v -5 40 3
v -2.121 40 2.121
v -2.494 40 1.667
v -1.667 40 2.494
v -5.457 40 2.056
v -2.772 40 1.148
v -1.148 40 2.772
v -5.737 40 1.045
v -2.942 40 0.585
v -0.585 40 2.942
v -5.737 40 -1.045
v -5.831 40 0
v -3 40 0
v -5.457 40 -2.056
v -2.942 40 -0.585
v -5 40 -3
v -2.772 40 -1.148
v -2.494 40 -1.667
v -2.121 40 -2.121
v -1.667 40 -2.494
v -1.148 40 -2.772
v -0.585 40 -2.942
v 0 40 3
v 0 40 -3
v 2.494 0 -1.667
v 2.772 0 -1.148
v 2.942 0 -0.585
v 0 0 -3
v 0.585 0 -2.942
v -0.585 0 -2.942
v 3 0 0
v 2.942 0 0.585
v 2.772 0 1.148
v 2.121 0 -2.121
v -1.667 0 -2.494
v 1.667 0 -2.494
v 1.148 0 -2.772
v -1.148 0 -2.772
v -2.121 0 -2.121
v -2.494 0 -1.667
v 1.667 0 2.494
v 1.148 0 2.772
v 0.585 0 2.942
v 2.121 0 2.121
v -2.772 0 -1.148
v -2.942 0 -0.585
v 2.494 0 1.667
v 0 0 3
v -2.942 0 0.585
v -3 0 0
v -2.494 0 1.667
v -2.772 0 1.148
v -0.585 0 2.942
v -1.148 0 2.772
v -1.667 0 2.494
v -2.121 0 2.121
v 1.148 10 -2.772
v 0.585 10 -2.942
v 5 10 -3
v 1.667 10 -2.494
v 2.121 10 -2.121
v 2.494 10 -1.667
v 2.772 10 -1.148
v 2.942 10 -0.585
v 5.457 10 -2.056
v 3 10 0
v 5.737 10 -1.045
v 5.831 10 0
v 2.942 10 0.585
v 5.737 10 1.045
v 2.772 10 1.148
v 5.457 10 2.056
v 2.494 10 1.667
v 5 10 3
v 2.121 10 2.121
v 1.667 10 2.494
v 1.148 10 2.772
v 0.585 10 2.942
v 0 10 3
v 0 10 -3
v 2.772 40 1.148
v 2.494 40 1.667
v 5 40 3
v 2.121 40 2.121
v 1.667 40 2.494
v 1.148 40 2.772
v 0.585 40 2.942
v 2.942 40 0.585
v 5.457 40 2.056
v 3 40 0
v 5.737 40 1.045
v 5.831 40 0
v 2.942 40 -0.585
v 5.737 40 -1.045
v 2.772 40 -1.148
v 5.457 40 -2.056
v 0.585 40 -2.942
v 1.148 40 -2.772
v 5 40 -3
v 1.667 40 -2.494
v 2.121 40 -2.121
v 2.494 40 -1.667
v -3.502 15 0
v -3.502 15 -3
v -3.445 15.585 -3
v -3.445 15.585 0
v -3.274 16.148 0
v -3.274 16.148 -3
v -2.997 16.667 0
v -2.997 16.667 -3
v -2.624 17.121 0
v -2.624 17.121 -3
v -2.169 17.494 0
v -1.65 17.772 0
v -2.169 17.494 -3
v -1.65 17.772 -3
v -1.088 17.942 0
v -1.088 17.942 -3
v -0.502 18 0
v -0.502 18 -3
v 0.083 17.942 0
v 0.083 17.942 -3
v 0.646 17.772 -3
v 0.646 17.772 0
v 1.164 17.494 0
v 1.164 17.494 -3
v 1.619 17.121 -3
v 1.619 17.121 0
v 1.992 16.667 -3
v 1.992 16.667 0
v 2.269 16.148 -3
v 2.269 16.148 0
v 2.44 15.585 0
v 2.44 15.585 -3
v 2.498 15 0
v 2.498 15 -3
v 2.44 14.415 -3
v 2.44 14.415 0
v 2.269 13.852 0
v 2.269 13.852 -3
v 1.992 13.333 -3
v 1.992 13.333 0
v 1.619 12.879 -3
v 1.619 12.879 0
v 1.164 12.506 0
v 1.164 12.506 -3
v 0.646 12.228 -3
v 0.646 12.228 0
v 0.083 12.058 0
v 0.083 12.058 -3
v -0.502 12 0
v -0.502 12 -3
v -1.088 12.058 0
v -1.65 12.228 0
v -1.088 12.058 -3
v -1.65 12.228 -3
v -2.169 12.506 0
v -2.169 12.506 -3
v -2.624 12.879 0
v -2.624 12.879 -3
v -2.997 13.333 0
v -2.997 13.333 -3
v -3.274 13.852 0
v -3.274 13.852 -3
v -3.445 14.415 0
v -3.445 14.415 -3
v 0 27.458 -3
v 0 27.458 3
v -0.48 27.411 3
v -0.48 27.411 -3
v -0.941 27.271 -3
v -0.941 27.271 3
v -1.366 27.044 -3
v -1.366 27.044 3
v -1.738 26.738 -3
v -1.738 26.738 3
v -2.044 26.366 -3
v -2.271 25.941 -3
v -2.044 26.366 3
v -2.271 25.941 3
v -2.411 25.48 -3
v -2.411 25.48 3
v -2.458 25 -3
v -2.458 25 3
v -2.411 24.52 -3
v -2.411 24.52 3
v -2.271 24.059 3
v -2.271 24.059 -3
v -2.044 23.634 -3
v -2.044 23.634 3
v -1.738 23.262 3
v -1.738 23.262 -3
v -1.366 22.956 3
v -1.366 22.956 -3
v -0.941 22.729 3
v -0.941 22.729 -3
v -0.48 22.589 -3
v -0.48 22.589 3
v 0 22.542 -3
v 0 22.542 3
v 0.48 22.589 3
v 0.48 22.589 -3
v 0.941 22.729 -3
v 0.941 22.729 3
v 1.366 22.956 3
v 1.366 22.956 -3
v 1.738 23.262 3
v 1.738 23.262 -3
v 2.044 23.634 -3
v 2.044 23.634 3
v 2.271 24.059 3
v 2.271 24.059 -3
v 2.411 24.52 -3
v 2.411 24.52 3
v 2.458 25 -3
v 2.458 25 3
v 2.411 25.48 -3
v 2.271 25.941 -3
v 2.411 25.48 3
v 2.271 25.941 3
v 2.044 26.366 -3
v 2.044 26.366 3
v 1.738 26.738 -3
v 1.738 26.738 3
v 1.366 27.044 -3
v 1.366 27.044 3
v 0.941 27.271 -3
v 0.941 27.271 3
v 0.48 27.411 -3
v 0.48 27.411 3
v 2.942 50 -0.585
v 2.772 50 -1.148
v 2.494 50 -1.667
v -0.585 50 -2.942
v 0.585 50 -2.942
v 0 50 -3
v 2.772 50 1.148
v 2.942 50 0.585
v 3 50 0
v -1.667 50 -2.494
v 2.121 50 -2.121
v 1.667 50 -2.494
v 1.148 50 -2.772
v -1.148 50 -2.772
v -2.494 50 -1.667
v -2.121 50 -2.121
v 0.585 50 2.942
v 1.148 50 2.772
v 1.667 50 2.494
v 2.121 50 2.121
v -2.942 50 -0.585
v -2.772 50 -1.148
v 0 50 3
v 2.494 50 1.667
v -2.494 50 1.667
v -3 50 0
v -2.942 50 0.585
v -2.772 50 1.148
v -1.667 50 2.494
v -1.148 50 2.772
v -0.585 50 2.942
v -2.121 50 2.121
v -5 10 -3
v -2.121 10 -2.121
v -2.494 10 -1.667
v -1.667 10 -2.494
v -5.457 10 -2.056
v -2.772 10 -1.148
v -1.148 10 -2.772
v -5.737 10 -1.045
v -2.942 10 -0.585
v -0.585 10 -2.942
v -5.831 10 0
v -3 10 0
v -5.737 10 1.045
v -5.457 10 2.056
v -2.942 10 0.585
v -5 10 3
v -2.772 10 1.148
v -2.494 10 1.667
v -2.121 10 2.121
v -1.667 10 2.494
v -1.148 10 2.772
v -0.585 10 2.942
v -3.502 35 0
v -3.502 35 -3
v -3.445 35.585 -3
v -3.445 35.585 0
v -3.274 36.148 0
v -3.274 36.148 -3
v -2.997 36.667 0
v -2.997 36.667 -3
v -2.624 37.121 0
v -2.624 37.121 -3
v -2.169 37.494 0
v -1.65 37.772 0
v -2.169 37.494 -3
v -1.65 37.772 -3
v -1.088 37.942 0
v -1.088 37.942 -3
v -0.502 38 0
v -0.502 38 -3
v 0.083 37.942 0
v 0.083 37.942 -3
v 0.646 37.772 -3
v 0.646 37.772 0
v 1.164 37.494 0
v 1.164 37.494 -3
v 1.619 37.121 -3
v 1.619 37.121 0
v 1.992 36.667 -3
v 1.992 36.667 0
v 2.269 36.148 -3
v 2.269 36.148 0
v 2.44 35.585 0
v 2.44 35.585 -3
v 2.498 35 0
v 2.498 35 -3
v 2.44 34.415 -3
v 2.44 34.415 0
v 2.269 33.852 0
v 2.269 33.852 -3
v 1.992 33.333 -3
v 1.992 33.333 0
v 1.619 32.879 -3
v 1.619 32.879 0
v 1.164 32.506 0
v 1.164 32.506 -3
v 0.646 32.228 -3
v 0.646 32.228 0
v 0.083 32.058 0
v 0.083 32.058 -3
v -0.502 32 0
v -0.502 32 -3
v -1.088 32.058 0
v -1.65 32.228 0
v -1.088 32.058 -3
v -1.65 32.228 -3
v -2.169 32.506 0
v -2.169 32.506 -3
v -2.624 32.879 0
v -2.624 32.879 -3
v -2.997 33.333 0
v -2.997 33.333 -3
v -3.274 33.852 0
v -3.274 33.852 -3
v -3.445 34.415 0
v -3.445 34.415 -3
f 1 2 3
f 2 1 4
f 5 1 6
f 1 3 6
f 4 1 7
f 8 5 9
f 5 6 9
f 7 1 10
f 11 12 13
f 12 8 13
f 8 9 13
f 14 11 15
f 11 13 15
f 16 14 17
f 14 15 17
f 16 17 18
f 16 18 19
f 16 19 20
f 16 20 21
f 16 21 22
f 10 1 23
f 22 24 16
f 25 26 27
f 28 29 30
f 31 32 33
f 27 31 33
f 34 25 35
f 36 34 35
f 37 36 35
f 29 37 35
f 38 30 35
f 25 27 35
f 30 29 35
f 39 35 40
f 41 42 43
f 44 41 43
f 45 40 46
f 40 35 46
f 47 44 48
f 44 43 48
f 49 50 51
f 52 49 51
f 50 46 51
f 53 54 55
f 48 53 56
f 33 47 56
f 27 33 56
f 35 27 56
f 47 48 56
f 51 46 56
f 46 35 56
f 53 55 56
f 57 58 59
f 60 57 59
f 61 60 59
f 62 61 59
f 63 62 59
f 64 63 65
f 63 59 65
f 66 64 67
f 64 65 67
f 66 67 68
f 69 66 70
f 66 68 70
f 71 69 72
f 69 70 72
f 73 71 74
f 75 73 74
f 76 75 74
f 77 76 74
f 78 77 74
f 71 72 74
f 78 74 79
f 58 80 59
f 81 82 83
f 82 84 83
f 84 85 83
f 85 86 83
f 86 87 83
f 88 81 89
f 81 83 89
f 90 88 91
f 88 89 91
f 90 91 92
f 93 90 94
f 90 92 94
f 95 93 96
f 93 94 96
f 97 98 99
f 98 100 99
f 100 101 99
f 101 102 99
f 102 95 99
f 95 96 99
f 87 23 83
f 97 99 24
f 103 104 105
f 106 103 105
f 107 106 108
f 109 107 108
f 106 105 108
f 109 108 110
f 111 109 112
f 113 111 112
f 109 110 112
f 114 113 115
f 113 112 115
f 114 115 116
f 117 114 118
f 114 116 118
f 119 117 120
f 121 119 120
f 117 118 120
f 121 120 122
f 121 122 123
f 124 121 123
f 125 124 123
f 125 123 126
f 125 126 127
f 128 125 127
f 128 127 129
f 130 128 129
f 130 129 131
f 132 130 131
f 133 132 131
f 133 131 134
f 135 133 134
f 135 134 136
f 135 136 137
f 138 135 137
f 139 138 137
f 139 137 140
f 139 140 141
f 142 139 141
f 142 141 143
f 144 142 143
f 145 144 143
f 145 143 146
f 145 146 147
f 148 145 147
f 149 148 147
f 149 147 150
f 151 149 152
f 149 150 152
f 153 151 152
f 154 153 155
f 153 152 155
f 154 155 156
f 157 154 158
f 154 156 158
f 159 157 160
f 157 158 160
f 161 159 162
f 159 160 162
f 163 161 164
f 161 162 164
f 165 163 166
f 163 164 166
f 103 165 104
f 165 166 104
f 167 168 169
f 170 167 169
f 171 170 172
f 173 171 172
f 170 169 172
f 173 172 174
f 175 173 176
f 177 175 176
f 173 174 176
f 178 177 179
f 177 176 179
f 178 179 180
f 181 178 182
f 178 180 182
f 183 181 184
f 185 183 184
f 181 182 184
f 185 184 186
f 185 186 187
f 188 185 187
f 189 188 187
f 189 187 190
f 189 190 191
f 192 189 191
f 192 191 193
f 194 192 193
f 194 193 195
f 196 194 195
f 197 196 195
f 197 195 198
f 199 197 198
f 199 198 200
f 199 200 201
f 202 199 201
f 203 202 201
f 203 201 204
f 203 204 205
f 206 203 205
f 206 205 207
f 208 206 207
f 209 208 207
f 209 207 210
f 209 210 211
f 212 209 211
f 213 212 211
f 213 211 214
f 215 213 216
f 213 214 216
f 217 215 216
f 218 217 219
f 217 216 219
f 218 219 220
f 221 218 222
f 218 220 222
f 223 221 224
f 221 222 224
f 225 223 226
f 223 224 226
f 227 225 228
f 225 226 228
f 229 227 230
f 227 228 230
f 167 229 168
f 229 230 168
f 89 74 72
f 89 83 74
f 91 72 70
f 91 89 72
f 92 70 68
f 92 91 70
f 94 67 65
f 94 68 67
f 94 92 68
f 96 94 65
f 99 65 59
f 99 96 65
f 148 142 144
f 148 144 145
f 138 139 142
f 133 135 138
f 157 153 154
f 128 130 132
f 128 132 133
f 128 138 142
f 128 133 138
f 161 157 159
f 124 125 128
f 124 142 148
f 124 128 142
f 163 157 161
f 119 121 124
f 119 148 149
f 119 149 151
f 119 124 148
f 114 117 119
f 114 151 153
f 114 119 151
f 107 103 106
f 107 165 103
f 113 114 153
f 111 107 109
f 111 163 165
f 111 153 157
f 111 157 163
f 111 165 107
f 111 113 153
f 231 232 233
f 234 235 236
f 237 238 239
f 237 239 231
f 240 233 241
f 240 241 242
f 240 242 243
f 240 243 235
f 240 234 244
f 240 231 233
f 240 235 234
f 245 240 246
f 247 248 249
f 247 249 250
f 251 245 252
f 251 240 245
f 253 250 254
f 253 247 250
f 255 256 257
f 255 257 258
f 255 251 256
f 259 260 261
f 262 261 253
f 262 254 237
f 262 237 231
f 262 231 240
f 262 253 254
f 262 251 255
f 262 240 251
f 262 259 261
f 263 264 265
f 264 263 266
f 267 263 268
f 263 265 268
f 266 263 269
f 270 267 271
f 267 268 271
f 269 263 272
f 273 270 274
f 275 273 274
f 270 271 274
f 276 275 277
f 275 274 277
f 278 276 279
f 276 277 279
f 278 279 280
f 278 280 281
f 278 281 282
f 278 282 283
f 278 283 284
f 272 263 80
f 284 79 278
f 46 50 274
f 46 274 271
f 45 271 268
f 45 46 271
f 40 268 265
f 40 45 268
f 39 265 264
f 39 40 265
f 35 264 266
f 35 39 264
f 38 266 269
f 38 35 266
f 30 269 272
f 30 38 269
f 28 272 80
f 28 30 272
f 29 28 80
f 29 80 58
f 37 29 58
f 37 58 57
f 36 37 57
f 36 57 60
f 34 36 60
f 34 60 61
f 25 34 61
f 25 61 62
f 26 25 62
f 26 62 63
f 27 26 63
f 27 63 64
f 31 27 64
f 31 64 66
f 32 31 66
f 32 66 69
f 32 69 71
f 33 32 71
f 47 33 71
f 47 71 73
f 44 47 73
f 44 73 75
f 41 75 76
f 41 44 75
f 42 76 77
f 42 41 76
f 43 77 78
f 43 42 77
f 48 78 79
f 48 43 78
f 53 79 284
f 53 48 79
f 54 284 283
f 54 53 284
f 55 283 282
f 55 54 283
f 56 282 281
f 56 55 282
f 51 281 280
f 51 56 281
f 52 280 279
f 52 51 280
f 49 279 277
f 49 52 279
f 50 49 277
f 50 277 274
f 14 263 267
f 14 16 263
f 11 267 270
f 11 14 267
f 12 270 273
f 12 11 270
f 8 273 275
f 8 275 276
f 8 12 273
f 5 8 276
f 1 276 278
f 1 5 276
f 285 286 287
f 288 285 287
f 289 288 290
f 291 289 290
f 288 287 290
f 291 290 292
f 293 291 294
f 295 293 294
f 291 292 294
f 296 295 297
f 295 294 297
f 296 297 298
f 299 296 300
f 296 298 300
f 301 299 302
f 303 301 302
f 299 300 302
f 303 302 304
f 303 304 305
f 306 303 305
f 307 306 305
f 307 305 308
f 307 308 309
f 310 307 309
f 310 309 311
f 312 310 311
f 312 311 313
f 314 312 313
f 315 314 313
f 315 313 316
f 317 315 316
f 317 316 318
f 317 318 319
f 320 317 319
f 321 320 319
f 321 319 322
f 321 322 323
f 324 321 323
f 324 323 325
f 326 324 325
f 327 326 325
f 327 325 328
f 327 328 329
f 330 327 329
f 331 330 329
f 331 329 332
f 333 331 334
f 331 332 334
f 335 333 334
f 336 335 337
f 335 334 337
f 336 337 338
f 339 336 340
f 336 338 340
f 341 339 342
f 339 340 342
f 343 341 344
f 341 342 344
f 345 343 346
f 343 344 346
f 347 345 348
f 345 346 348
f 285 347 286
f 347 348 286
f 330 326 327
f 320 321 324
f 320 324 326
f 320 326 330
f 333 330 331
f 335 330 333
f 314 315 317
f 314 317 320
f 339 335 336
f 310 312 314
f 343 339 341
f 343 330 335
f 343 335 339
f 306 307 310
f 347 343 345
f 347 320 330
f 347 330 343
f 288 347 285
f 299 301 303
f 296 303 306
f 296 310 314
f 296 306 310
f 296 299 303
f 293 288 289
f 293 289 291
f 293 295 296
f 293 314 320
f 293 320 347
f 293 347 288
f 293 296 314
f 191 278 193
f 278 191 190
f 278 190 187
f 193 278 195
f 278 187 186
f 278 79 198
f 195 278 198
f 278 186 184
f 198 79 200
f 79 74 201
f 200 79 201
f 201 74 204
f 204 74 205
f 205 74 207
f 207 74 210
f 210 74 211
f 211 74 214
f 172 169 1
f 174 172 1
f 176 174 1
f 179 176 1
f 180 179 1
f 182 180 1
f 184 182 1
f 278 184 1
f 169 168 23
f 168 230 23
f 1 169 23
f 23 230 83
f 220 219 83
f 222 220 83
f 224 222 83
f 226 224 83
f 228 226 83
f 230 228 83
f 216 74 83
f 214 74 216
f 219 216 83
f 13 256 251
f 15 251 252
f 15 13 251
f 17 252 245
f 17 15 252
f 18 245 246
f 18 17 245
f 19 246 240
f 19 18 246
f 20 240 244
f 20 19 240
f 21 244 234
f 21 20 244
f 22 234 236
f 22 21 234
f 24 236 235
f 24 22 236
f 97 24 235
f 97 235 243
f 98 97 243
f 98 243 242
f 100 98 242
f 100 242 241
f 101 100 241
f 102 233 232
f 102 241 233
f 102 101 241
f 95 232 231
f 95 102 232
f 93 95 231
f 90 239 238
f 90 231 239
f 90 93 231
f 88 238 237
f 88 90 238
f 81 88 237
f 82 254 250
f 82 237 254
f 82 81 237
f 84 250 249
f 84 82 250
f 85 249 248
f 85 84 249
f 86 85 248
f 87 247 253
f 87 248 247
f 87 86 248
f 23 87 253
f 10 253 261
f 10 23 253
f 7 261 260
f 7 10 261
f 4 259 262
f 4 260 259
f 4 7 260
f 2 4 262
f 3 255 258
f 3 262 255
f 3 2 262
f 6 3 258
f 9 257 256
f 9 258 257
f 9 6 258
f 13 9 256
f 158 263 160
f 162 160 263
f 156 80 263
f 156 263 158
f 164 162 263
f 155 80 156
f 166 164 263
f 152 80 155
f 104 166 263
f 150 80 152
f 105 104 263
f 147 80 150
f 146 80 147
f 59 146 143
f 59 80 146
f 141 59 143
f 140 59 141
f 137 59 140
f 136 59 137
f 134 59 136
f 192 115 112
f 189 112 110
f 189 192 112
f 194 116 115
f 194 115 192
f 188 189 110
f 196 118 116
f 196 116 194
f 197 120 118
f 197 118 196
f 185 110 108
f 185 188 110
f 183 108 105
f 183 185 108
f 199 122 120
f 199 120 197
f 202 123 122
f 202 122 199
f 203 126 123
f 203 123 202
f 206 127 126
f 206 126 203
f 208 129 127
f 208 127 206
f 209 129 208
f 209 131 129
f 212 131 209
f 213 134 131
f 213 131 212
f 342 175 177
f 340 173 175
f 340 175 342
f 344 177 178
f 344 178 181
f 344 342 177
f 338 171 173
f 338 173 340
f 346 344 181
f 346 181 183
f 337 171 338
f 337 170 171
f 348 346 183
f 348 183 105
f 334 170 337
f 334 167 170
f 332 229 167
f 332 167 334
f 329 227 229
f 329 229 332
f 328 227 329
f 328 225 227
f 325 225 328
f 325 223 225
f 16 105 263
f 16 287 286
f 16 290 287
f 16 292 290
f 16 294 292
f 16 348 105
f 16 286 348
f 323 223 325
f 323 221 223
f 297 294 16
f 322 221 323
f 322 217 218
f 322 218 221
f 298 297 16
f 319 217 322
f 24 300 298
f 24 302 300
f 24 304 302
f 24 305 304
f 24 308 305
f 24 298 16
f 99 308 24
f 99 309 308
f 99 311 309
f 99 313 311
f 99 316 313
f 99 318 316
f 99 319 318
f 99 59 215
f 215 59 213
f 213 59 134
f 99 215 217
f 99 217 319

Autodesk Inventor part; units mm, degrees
ref_plane "XZ Plane" through (0, 0, 0) normal (0, 1, 0) x (-1, 0, 0)
ref_plane "XY Plane" through (0, 0, 0) normal (0, 0, 1) x (1, 0, 0)
sketch "Sketch1" plane through (0, 0, 0) normal (0, 1, 0) x (-1, 0, 0)
  circle A0 centre (0, 0) radius 3
  dimension "d0" = 6
extrude "Extrusion1" add sketch "Sketch1" along normal blind 50
ref_plane "Work Plane1" through (8, 0, 0) normal (1, 0, 0) x (0, 1, 0)
sketch "Sketch2" plane through (8, 0, 0) normal (1, 0, 0) x (0, 1, 0)
  line L0 (0, -3) -> (50, -3) projected
  line L1 (0, 3) -> (50, 3) projected
  line L2 (40, -3) -> (20, -3)
  line L3 (20, -3) -> (20, 3)
  line L4 (20, 3) -> (40, 3)
  line L5 (40, 3) -> (40, -3)
  line L6 (20, -3) -> (10, -3)
  line L7 (10, -3) -> (10, 3)
  line L8 (10, 3) -> (20, 3)
  line L9 (20, 3) -> (20, -3)
  line L10 (0, -3) -> (0, 3) projected
  line L11 (50, -3) -> (50, 3) projected
  point P0 (0, 0)
  point P1 (20, -3)
  point P2 (20, 3)
  point P3 (10, 3)
  point P4 (10, -3)
  point P5 (40, 3)
  point P6 (20, -3)
  dimension "d4" = 20
  dimension "d5" = 10
  dimension "d7" = 10
  dimension "d19" = 30
extrude "Extrusion2" add sketch "Sketch2" against normal blind 14 contours L7 L1 L3 L0 | L3 L1 L5 L0
sketch "Sketch6" plane through (8, 10, -3) normal (0, 0, -1) x (-1, 0, 0)
  circle A0 centre (8.5023, 25) radius 3
  circle A1 centre (8.5023, 5) radius 3
  line L0 (8, 30) -> (14, 30) projected
  line L1 (8, 0) -> (14, 0) projected
  point P0 (8, -10)
  dimension "d36" = 6
  dimension "d37" = 6
  dimension "d38" = 0
  dimension "d39" = 5
  dimension "d40" = 5
extrude "Extrusion5" cut sketch "Sketch6" against normal blind 3
sketch "Sketch7" plane through (8, 10, -3) normal (0, 0, -1) x (-1, 0, 0)
  line L0 (14, 30) -> (14, 0) projected
  line L1 (8, 30) -> (14, 30) projected
  point P0 (8, -10)
  point P1 (8, 15)
  dimension "d43" = 6
  dimension "d44" = 15
hole "Hole2" at (0, 25, -3) direction (0, 0, 1) diameter 4.917 end through all thread size "M6x1" class "6H" standard "ISO Metric profile"
sketch "Sketch9" plane through (-6, 40, -3) normal (0, 1, 0) x (1, 0, 0)
  circle A0 centre (6, -3) radius 5.831
  circle A1 centre (6, -3) radius 3 projected
  circle A2 centre (6, -3) radius 10
  dimension "d54" = 11.662
  dimension "d55" = 20
extrude "Extrusion7" cut sketch "Sketch9" against normal blind 40 contours A2
properties part number "slider"
